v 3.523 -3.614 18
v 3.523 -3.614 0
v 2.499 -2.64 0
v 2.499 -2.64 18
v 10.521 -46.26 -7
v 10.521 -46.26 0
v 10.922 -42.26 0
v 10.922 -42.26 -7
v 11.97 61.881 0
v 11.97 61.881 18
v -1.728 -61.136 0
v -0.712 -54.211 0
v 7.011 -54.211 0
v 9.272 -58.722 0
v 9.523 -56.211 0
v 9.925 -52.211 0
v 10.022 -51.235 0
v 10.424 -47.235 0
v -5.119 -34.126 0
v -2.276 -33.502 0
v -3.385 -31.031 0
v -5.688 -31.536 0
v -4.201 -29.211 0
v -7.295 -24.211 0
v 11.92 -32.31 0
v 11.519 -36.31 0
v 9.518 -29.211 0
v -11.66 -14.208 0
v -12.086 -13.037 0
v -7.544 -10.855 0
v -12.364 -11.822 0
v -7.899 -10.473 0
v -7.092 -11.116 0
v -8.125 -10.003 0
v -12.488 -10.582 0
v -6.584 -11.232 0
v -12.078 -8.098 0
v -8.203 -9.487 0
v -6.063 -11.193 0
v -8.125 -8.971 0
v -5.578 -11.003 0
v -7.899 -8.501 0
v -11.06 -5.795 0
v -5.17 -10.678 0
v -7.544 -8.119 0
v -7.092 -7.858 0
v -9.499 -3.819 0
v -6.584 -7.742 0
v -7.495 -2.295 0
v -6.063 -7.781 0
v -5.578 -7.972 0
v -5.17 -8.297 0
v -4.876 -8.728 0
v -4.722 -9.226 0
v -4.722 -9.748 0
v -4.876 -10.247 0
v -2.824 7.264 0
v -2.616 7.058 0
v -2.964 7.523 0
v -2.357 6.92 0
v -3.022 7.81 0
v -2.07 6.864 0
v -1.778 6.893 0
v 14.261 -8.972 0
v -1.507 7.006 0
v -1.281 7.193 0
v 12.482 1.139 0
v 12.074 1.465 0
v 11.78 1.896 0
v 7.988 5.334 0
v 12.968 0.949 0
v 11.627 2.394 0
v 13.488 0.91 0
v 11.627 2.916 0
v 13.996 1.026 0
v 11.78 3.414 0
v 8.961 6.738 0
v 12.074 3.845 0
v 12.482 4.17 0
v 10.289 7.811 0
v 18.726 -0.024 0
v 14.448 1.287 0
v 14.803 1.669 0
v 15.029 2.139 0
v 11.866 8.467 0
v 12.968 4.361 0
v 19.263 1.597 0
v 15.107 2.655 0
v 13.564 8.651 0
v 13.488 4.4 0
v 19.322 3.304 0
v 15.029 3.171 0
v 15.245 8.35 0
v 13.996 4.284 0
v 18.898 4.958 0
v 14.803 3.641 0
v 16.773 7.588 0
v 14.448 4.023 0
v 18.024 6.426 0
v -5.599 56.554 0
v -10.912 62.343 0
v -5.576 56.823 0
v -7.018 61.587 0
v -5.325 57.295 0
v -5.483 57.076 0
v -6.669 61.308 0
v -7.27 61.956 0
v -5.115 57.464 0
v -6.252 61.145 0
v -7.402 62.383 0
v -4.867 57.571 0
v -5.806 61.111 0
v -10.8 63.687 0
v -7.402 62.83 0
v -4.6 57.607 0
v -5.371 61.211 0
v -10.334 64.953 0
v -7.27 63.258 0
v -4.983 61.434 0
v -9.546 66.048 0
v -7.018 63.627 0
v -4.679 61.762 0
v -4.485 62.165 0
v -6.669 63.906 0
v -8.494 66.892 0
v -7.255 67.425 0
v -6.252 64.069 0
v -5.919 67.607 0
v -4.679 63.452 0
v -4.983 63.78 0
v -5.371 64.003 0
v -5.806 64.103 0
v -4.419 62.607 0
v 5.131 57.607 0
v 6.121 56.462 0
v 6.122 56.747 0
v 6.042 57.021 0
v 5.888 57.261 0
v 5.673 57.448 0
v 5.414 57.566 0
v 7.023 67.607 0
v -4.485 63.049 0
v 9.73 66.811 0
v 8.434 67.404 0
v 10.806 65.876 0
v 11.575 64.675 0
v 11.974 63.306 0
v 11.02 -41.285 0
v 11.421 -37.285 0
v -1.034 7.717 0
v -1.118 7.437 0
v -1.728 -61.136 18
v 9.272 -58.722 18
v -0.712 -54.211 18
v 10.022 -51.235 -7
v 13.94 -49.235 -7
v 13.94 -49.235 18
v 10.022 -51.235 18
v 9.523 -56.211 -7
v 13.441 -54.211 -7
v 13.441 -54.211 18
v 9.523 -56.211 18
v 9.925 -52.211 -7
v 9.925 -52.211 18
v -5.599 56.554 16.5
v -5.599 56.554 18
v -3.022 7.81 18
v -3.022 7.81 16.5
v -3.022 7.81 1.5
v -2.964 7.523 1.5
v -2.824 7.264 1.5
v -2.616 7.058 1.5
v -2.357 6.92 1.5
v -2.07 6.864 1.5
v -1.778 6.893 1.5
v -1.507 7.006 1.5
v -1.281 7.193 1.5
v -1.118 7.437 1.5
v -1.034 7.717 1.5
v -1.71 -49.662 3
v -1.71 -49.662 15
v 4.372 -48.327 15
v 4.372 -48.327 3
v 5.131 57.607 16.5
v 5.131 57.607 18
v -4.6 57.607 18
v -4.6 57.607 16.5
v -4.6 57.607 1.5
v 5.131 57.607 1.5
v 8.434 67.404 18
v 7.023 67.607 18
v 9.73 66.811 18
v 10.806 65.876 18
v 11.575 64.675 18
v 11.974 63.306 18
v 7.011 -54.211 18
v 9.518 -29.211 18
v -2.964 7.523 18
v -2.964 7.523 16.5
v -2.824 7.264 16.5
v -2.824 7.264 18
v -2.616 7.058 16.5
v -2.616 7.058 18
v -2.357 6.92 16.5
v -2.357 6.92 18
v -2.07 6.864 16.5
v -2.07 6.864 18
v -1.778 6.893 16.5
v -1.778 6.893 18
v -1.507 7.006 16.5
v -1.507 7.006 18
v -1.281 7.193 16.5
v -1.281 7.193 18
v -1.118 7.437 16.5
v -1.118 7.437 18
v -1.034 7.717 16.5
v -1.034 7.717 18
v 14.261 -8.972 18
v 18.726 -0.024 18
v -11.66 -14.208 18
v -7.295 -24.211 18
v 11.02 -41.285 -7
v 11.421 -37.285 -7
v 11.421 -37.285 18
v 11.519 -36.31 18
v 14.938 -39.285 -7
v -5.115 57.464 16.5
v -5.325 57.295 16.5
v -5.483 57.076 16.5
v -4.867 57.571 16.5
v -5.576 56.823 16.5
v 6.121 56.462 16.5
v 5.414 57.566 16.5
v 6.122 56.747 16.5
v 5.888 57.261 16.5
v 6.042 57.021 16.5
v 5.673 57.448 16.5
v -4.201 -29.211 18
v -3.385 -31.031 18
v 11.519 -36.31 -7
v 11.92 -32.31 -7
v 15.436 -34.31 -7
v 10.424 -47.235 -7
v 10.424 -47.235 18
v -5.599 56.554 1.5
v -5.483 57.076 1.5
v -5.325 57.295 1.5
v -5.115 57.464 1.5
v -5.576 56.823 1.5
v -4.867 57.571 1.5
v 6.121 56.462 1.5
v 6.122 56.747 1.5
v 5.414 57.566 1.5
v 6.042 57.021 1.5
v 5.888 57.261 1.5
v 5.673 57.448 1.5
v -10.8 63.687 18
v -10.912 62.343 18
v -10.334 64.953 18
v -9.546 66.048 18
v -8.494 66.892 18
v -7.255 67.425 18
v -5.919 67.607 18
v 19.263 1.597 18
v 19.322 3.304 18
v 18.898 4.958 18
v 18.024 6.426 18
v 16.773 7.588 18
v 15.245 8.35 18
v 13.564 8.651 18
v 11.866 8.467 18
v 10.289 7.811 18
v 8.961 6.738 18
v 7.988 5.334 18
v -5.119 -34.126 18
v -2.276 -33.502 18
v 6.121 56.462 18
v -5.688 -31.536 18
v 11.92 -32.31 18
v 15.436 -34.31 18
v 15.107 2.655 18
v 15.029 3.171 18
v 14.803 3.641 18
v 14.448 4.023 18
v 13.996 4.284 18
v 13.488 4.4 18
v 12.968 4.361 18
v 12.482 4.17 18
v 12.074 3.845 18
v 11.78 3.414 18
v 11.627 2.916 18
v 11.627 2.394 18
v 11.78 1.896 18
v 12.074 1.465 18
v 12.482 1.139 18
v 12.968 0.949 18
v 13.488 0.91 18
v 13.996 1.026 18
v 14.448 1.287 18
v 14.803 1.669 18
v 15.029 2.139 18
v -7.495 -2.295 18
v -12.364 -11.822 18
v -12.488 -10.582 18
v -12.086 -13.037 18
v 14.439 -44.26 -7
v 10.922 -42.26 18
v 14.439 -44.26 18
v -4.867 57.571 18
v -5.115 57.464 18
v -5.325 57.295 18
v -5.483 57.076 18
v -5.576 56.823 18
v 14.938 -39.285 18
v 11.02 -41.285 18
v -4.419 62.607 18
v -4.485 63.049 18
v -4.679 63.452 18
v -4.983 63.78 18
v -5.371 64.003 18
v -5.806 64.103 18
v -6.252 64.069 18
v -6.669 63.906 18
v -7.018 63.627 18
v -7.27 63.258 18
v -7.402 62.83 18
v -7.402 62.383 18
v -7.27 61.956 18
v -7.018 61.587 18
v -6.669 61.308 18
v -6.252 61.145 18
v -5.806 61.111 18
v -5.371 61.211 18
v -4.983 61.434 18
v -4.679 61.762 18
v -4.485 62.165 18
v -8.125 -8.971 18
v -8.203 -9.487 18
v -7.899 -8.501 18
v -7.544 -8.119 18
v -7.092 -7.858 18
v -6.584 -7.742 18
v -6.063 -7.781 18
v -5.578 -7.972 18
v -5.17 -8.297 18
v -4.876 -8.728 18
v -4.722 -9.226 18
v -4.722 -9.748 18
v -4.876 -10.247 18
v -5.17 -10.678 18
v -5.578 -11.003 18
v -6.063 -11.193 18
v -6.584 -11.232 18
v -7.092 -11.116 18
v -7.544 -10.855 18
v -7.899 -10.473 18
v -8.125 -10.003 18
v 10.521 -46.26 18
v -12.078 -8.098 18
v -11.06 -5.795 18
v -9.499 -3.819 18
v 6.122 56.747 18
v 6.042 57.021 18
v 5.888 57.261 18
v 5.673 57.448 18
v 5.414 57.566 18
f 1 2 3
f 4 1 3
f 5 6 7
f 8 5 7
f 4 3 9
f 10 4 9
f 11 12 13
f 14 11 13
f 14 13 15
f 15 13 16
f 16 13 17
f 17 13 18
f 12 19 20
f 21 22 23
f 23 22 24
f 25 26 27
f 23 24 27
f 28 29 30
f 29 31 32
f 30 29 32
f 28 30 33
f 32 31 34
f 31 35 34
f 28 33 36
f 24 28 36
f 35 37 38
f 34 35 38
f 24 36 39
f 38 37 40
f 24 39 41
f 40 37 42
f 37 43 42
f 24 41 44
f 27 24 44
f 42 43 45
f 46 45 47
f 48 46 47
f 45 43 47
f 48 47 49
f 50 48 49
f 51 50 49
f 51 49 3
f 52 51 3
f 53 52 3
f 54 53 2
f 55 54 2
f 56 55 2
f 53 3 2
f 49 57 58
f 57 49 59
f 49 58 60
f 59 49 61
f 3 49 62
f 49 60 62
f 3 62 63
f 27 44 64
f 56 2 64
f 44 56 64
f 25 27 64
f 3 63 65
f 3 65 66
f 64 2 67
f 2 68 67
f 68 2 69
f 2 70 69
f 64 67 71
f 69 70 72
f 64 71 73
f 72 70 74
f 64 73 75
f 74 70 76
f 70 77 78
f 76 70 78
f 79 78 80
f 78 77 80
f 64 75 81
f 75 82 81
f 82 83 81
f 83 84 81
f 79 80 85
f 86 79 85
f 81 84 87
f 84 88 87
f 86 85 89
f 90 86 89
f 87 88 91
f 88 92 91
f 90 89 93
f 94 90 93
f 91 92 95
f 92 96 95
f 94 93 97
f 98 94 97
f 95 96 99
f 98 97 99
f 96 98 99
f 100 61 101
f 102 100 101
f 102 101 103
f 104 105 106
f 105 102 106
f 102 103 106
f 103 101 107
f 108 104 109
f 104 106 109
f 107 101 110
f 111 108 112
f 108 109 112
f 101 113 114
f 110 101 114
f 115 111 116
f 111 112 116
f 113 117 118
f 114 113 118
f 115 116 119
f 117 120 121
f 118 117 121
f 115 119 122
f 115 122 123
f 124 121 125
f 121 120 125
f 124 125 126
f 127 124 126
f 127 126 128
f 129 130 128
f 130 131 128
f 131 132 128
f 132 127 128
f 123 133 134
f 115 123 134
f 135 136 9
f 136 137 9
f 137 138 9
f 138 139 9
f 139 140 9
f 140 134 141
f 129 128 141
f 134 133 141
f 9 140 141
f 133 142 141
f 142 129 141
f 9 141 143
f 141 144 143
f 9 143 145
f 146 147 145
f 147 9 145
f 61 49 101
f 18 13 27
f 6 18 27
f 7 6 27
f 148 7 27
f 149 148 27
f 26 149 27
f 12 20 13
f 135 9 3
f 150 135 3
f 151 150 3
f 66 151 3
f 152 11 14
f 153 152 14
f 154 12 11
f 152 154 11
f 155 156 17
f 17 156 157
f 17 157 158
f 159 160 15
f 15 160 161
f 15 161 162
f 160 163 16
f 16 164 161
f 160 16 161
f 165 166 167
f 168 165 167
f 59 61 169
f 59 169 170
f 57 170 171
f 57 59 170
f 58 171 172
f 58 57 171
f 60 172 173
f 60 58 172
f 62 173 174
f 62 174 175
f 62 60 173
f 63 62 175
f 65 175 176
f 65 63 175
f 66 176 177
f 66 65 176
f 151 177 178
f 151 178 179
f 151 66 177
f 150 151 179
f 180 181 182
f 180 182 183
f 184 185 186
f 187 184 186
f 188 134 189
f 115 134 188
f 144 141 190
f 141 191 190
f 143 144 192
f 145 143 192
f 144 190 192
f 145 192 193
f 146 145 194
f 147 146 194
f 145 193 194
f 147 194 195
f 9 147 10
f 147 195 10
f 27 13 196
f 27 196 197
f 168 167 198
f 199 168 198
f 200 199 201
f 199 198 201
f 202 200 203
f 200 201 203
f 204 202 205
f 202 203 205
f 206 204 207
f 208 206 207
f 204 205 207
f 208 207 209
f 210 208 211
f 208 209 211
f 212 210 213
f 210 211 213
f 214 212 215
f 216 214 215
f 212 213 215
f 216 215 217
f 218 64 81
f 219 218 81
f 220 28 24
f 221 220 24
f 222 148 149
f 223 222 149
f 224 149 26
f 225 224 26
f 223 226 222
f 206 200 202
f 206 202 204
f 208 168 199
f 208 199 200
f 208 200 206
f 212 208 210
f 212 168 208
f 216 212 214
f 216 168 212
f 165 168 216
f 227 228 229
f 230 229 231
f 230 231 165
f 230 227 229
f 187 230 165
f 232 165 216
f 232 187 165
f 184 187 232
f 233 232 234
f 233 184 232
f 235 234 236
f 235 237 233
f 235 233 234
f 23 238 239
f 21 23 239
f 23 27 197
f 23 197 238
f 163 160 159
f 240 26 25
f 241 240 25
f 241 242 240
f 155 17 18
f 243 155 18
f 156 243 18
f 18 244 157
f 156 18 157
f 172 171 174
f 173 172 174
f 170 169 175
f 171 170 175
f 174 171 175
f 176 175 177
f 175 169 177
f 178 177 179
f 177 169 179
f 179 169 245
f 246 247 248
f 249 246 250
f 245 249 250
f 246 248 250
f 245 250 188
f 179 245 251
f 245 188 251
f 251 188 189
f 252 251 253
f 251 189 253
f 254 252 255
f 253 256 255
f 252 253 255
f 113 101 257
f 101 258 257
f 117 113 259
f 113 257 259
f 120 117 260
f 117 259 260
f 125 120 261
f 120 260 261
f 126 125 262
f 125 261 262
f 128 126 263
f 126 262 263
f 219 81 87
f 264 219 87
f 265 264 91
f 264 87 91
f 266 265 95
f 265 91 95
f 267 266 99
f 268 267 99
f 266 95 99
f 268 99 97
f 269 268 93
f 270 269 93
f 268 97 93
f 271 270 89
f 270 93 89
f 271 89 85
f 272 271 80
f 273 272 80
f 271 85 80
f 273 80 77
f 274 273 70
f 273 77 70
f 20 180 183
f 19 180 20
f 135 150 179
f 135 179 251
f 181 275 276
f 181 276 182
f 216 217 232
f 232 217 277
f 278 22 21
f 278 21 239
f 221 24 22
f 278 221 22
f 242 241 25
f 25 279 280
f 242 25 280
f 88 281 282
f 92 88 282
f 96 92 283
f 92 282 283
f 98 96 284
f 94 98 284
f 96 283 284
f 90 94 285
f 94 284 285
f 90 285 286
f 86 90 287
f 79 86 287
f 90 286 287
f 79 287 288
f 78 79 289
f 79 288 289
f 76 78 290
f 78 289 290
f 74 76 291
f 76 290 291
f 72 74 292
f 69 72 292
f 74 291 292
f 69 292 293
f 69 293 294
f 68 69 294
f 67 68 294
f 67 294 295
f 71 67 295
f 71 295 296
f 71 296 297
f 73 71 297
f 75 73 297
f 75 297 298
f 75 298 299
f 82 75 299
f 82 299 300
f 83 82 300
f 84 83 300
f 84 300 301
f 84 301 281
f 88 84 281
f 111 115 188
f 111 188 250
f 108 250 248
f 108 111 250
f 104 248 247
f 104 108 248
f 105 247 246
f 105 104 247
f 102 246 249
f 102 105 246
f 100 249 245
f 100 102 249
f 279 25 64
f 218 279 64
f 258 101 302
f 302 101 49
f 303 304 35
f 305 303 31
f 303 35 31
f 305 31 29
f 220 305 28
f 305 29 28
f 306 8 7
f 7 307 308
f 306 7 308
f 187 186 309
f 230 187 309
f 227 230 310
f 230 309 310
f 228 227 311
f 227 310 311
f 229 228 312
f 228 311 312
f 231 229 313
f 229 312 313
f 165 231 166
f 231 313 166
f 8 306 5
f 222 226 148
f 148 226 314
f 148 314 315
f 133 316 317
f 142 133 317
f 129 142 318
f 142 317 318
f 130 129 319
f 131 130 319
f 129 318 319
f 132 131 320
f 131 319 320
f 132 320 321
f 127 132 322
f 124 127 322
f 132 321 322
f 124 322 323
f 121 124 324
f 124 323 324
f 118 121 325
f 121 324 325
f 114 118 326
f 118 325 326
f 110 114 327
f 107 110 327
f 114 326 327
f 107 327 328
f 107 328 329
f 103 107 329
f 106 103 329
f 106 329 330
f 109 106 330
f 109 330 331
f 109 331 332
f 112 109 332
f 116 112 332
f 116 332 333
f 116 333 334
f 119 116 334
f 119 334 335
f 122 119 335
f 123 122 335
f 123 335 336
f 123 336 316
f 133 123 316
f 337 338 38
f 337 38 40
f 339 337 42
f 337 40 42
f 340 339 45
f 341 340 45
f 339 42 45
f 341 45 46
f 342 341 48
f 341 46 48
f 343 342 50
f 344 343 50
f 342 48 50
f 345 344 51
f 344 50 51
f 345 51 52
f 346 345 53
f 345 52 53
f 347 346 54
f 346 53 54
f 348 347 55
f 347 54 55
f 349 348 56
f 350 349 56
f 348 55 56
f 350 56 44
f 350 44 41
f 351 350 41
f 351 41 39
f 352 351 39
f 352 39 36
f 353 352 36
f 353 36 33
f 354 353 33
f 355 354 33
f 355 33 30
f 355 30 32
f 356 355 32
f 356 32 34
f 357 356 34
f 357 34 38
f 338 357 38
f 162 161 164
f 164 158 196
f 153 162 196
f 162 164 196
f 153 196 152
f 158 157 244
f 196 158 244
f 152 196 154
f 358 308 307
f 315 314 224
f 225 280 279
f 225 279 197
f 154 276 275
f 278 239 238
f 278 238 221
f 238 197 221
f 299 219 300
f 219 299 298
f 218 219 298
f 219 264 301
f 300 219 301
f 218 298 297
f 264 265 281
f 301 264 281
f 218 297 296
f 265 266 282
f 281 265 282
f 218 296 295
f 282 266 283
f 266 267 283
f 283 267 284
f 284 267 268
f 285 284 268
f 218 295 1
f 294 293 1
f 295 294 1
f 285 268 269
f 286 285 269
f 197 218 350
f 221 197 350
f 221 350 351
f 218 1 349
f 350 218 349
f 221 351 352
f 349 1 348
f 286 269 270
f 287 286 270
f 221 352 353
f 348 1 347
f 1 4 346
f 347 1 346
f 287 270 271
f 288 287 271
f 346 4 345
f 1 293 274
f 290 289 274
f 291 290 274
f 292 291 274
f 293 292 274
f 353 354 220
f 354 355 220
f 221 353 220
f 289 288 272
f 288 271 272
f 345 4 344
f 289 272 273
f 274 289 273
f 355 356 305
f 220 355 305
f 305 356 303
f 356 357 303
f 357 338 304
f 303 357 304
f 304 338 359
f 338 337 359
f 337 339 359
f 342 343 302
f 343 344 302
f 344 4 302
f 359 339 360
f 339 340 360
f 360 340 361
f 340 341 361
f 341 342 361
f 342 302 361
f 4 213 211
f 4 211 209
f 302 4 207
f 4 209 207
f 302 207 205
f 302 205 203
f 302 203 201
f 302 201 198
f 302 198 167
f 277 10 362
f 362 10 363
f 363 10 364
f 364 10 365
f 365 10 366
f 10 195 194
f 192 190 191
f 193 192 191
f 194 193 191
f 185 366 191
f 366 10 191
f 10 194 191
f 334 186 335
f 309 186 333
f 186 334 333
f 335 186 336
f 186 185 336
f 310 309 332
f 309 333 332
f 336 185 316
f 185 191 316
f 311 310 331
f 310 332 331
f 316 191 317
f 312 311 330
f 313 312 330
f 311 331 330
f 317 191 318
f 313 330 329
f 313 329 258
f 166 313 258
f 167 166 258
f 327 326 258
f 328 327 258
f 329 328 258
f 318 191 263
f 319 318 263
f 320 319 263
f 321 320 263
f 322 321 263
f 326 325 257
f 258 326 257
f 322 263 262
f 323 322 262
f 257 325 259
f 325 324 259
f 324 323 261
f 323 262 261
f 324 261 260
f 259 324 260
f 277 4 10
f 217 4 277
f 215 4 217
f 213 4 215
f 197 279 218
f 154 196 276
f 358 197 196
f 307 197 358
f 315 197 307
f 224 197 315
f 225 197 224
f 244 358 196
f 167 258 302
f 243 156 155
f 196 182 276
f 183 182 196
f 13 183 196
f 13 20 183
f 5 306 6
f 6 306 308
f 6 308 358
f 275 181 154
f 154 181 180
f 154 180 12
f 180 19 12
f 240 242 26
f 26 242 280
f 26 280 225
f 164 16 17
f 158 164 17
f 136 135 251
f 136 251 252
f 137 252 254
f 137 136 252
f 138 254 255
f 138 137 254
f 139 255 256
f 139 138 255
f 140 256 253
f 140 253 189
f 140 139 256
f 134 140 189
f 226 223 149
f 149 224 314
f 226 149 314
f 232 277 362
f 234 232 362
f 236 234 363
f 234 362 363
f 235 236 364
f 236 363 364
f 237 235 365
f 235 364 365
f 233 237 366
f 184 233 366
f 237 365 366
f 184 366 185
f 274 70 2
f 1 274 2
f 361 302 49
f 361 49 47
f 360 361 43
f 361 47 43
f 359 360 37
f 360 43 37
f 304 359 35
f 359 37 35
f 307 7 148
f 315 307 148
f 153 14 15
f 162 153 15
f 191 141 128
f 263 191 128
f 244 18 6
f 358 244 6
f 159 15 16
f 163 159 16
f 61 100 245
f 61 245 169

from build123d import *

# Parameters (mm, degrees)
BOSS_EXTRUDE1_DEPTH = 18
CUT_EXTRUDE1_DEPTH  = 25
BOSS_EXTRUDE2_DEPTH = 25
LPATTERN1_COUNT     = 5
LPATTERN1_PITCH     = 5
FILLET1_R           = 10
FILLET2_R           = 5
SKETCH6_R           = 1.5
CUT_EXTRUDE2_DEPTH  = 25
CUT_EXTRUDE3_DEPTH  = 8
SKETCH8_R           = 1.75
CUT_EXTRUDE4_DEPTH  = 61
SKETCH9_R           = 1.75
CUT_EXTRUDE5_DEPTH  = 25
CUT_EXTRUDE6_DEPTH  = 1.5


with BuildPart() as part:
    # Sketch1 → Boss-Extrude1 (new body)
    with BuildSketch(Plane.XY):
        with BuildLine():
            Line((2.499482963, -2.64043917), (12.810164454, 67.606908446))
            Line((12.810164454, 67.606908446), (-11.189835546, 67.606908446))
            Line((-11.189835546, 67.606908446), (-7.494565689, -2.295487655))
            Line((-7.494565689, -2.295487655), (-12.494565689, -2.295487655))
            Line((-12.494565689, -2.295487655), (-12.494565689, -12.295487655))
            Line((-12.494565689, -12.295487655), (-7.295314078, -24.210511057))
            Line((-7.295314078, -24.210511057), (-0.711849738, -54.210511057))
            Line((-0.711849738, -54.210511057), (-1.728395801, -61.136305893))
            Line((-1.728395801, -61.136305893), (9.271604199, -58.722368968))
            Line((9.271604199, -58.722368968), (14.26065829, -8.971898224))
            Line((14.26065829, -8.971898224), (18.725806397, -0.0241358))
            ThreePointArc((18.725806397, -0.0241358), (16.036237527, 8.023610308), (7.988491349, 5.334041648))
            Line((7.988491349, 5.334041648), (3.523343243, -3.613720776))
            Line((3.523343243, -3.613720776), (2.499482963, -2.64043917))
        make_face()
    extrude(amount=BOSS_EXTRUDE1_DEPTH)

    # Sketch4 → Cut-Extrude1 (cut)
    with BuildSketch(Plane(origin=(0, 0, 0), x_dir=(-1, 0, 0), z_dir=(0, 0, -1))):
        Polygon((-7.01051812, -54.210511057), (-9.517556755, -29.210511057), (4.20080561, -29.210511057), align=None)
    extrude(amount=-CUT_EXTRUDE1_DEPTH, mode=Mode.SUBTRACT)

    # Sketch5 → Boss-Extrude2 (add)
    with BuildSketch(Plane.XY.offset(18)):
        Polygon((9.523497192, -56.210511057), (9.924623374, -52.210511057), (13.440851715, -54.210511057), align=None)
    boss_extrude2 = extrude(amount=-BOSS_EXTRUDE2_DEPTH)

    # LPattern1: Boss-Extrude2 ×5
    with Locations(*[Vector(0.09978108182512832, 0.9950094148850086, 0) * (i * LPATTERN1_PITCH) for i in range(1, LPATTERN1_COUNT)]):
        add(boss_extrude2)

    # Fillet1
    # the kernel refuses this fillet: 10 mm, written as the material it takes off along each edge
    with BuildSketch(Plane(origin=(-12.494565689, -12.295487655, -5.216984474), x_dir=(0, 1, 0), z_dir=(0, 0, 1))) as fillet1_piece_1:
        with BuildLine():
            CenterArc((FILLET1_R * 0.208679378975, -FILLET1_R), FILLET1_R, 90, 23.574579649)
            Line((-FILLET1_R * 0.191263052627, -FILLET1_R * 0.0834597382526), (-FILLET1_R * 0.199261901259, -FILLET1_R * 0.0651289330176))
            Line((-FILLET1_R * 0.199261901259, -FILLET1_R * 0.0651289330176), (-FILLET1_R * 0.0041735875795, FILLET1_R * 0.02))
            Line((-FILLET1_R * 0.0041735875795, FILLET1_R * 0.02), (FILLET1_R * 0.208679378975, FILLET1_R * 0.02))
            Line((FILLET1_R * 0.208679378975, FILLET1_R * 0.02), (FILLET1_R * 0.208679378975, 0))
        make_face()
    extrude(amount=28.433968949, mode=Mode.SUBTRACT)
    with BuildSketch(Plane(origin=(-12.494565689, -2.295487655, -21.650635095), x_dir=(1, 0, 0), z_dir=(0, 0, 1))) as fillet1_piece_2:
        with BuildLine():
            CenterArc((10, -8.660254038), FILLET1_R, 120, 60)
            Line((0, -8.660254038), (-0.2, -8.660254038))
            Line((-0.2, -8.660254038), (-0.2, 0))
            Line((-0.2, 0), (0, 0.2))
            ThreePointArc((0, 0.2), (2.5, 0.2), (4.9, 0.173205081))
            Line((4.9, 0.173205081), (5, 0))
        make_face()
    extrude(amount=61.301270189, mode=Mode.SUBTRACT)

    # Fillet2
    fillet2_edges = [part.edges().sort_by_distance(p)[0] for p in [
        (-11.189835546, 67.606908446, 9),
        (12.810164454, 67.606908446, 9),
    ]]
    fillet(fillet2_edges, radius=FILLET2_R)

    # Sketch6 → Cut-Extrude2 (cut)
    with BuildSketch(Plane.XY.offset(18)):
        with Locations((-5.91853771, 62.606908446)):
            Circle(SKETCH6_R)
    extrude(amount=-CUT_EXTRUDE2_DEPTH, mode=Mode.SUBTRACT)

    # Sketch7 → Cut-Extrude3 (cut)
    with BuildSketch(Plane(origin=(-12.028992373, -2.639748078, 0), x_dir=(0, 0, 1), z_dir=(-0.9767573067708646, -0.21434822991974342, 0))):
        Polygon((-0.5, -29.584055917), (18.5, -29.584055917), (15, -48.14094063), (3, -48.14094063), align=None)
    extrude(amount=-CUT_EXTRUDE3_DEPTH, mode=Mode.SUBTRACT)

    # Sketch8 → Cut-Extrude4 (cut)
    with BuildSketch(Plane.XY.offset(18)):
        with Locations((13.357148803, 2.654952784)):
            Circle(SKETCH8_R)
    extrude(amount=-CUT_EXTRUDE4_DEPTH, mode=Mode.SUBTRACT)

    # Sketch9 → Cut-Extrude5 (cut)
    with BuildSketch(Plane(origin=(0, 0, 0), x_dir=(-1, 0, 0), z_dir=(0, 0, -1))):
        with Locations((6.452791989, -9.487217743)):
            Circle(SKETCH9_R)
    extrude(amount=-CUT_EXTRUDE5_DEPTH, mode=Mode.SUBTRACT)

    # Sketch10 → Cut-Extrude6 (cut)
    with BuildSketch(Plane(origin=(0, 0, 0), x_dir=(-1, 0, 0), z_dir=(0, 0, -1))):
        with BuildLine():
            Line((-5.131333655, 57.606908446), (4.599961749, 57.606908446))
            ThreePointArc((4.599961749, 57.606908446), (5.325492441, 57.295098257), (5.598567407, 56.554118877))
            Line((5.598567407, 56.554118877), (3.02178942, 7.809923601))
            ThreePointArc((3.02178942, 7.809923601), (2.069628089, 6.863792291), (1.033784499, 7.717492305))
            Line((1.033784499, 7.717492305), (-6.120732918, 56.46168758))
            ThreePointArc((-6.120732918, 56.46168758), (-5.888043926, 57.260658832), (-5.131333655, 57.606908446))
        make_face()
    cut_extrude6 = extrude(amount=-CUT_EXTRUDE6_DEPTH, mode=Mode.SUBTRACT)

    # Mirror1: Cut-Extrude6 across plane
    add(cut_extrude6.mirror(Plane(origin=(0, 0, 9), x_dir=(1, 0, 0), z_dir=(0, 0, -1))), mode=Mode.SUBTRACT)


solid = part.part
